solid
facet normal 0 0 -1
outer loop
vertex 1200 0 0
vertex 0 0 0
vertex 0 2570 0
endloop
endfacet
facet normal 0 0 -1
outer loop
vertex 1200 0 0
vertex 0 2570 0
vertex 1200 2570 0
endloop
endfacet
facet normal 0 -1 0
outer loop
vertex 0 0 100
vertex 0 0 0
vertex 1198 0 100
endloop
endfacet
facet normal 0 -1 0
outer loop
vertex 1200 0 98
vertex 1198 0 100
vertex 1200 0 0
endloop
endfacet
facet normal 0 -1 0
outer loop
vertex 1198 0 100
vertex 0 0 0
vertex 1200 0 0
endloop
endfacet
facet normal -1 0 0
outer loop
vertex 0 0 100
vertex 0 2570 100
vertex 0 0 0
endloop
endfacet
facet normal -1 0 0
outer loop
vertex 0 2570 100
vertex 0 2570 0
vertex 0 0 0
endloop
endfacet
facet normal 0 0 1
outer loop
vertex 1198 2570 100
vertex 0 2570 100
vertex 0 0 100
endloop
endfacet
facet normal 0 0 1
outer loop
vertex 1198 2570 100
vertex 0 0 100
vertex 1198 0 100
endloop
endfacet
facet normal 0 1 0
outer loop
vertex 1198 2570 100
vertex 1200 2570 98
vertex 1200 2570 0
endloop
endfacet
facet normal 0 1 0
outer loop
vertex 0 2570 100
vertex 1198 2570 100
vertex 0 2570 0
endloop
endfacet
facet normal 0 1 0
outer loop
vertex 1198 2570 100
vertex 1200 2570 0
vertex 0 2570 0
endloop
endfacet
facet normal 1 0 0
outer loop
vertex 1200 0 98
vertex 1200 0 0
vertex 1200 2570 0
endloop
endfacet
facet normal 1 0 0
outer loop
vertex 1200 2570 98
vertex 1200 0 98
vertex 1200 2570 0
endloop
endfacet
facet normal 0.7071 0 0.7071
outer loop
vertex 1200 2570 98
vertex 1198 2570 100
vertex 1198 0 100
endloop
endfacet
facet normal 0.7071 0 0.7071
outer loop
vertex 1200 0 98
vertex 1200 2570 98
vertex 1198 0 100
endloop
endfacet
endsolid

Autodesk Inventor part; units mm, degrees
ref_plane "YZ Plane" through (0, 0, 0) normal (1, 0, 0) x (0, 1, 0)
ref_plane "XZ Plane" through (0, 0, 0) normal (0, 1, 0) x (-1, 0, 0)
ref_plane "XY Plane" through (0, 0, 0) normal (0, 0, 1) x (1, 0, 0)
sketch "Sketch1" plane through (0, 0, 0) normal (0, 0, 1) x (1, 0, 0)
  line L0 (0, 0) -> (1200, 0)
  line L1 (1200, 0) -> (1200, 2570)
  line L2 (1200, 2570) -> (0, 2570)
  line L3 (0, 2570) -> (0, 0)
  dimension "d0" = 1200
  dimension "d1" = 2570
extrude "Extrusion1" add sketch "Sketch1" along normal blind 100
chamfer "Chamfer1" distance 2 angle 45 1 edges at (1200, 1285, 100)
properties part number "GnG- -Sandwich wall low"
